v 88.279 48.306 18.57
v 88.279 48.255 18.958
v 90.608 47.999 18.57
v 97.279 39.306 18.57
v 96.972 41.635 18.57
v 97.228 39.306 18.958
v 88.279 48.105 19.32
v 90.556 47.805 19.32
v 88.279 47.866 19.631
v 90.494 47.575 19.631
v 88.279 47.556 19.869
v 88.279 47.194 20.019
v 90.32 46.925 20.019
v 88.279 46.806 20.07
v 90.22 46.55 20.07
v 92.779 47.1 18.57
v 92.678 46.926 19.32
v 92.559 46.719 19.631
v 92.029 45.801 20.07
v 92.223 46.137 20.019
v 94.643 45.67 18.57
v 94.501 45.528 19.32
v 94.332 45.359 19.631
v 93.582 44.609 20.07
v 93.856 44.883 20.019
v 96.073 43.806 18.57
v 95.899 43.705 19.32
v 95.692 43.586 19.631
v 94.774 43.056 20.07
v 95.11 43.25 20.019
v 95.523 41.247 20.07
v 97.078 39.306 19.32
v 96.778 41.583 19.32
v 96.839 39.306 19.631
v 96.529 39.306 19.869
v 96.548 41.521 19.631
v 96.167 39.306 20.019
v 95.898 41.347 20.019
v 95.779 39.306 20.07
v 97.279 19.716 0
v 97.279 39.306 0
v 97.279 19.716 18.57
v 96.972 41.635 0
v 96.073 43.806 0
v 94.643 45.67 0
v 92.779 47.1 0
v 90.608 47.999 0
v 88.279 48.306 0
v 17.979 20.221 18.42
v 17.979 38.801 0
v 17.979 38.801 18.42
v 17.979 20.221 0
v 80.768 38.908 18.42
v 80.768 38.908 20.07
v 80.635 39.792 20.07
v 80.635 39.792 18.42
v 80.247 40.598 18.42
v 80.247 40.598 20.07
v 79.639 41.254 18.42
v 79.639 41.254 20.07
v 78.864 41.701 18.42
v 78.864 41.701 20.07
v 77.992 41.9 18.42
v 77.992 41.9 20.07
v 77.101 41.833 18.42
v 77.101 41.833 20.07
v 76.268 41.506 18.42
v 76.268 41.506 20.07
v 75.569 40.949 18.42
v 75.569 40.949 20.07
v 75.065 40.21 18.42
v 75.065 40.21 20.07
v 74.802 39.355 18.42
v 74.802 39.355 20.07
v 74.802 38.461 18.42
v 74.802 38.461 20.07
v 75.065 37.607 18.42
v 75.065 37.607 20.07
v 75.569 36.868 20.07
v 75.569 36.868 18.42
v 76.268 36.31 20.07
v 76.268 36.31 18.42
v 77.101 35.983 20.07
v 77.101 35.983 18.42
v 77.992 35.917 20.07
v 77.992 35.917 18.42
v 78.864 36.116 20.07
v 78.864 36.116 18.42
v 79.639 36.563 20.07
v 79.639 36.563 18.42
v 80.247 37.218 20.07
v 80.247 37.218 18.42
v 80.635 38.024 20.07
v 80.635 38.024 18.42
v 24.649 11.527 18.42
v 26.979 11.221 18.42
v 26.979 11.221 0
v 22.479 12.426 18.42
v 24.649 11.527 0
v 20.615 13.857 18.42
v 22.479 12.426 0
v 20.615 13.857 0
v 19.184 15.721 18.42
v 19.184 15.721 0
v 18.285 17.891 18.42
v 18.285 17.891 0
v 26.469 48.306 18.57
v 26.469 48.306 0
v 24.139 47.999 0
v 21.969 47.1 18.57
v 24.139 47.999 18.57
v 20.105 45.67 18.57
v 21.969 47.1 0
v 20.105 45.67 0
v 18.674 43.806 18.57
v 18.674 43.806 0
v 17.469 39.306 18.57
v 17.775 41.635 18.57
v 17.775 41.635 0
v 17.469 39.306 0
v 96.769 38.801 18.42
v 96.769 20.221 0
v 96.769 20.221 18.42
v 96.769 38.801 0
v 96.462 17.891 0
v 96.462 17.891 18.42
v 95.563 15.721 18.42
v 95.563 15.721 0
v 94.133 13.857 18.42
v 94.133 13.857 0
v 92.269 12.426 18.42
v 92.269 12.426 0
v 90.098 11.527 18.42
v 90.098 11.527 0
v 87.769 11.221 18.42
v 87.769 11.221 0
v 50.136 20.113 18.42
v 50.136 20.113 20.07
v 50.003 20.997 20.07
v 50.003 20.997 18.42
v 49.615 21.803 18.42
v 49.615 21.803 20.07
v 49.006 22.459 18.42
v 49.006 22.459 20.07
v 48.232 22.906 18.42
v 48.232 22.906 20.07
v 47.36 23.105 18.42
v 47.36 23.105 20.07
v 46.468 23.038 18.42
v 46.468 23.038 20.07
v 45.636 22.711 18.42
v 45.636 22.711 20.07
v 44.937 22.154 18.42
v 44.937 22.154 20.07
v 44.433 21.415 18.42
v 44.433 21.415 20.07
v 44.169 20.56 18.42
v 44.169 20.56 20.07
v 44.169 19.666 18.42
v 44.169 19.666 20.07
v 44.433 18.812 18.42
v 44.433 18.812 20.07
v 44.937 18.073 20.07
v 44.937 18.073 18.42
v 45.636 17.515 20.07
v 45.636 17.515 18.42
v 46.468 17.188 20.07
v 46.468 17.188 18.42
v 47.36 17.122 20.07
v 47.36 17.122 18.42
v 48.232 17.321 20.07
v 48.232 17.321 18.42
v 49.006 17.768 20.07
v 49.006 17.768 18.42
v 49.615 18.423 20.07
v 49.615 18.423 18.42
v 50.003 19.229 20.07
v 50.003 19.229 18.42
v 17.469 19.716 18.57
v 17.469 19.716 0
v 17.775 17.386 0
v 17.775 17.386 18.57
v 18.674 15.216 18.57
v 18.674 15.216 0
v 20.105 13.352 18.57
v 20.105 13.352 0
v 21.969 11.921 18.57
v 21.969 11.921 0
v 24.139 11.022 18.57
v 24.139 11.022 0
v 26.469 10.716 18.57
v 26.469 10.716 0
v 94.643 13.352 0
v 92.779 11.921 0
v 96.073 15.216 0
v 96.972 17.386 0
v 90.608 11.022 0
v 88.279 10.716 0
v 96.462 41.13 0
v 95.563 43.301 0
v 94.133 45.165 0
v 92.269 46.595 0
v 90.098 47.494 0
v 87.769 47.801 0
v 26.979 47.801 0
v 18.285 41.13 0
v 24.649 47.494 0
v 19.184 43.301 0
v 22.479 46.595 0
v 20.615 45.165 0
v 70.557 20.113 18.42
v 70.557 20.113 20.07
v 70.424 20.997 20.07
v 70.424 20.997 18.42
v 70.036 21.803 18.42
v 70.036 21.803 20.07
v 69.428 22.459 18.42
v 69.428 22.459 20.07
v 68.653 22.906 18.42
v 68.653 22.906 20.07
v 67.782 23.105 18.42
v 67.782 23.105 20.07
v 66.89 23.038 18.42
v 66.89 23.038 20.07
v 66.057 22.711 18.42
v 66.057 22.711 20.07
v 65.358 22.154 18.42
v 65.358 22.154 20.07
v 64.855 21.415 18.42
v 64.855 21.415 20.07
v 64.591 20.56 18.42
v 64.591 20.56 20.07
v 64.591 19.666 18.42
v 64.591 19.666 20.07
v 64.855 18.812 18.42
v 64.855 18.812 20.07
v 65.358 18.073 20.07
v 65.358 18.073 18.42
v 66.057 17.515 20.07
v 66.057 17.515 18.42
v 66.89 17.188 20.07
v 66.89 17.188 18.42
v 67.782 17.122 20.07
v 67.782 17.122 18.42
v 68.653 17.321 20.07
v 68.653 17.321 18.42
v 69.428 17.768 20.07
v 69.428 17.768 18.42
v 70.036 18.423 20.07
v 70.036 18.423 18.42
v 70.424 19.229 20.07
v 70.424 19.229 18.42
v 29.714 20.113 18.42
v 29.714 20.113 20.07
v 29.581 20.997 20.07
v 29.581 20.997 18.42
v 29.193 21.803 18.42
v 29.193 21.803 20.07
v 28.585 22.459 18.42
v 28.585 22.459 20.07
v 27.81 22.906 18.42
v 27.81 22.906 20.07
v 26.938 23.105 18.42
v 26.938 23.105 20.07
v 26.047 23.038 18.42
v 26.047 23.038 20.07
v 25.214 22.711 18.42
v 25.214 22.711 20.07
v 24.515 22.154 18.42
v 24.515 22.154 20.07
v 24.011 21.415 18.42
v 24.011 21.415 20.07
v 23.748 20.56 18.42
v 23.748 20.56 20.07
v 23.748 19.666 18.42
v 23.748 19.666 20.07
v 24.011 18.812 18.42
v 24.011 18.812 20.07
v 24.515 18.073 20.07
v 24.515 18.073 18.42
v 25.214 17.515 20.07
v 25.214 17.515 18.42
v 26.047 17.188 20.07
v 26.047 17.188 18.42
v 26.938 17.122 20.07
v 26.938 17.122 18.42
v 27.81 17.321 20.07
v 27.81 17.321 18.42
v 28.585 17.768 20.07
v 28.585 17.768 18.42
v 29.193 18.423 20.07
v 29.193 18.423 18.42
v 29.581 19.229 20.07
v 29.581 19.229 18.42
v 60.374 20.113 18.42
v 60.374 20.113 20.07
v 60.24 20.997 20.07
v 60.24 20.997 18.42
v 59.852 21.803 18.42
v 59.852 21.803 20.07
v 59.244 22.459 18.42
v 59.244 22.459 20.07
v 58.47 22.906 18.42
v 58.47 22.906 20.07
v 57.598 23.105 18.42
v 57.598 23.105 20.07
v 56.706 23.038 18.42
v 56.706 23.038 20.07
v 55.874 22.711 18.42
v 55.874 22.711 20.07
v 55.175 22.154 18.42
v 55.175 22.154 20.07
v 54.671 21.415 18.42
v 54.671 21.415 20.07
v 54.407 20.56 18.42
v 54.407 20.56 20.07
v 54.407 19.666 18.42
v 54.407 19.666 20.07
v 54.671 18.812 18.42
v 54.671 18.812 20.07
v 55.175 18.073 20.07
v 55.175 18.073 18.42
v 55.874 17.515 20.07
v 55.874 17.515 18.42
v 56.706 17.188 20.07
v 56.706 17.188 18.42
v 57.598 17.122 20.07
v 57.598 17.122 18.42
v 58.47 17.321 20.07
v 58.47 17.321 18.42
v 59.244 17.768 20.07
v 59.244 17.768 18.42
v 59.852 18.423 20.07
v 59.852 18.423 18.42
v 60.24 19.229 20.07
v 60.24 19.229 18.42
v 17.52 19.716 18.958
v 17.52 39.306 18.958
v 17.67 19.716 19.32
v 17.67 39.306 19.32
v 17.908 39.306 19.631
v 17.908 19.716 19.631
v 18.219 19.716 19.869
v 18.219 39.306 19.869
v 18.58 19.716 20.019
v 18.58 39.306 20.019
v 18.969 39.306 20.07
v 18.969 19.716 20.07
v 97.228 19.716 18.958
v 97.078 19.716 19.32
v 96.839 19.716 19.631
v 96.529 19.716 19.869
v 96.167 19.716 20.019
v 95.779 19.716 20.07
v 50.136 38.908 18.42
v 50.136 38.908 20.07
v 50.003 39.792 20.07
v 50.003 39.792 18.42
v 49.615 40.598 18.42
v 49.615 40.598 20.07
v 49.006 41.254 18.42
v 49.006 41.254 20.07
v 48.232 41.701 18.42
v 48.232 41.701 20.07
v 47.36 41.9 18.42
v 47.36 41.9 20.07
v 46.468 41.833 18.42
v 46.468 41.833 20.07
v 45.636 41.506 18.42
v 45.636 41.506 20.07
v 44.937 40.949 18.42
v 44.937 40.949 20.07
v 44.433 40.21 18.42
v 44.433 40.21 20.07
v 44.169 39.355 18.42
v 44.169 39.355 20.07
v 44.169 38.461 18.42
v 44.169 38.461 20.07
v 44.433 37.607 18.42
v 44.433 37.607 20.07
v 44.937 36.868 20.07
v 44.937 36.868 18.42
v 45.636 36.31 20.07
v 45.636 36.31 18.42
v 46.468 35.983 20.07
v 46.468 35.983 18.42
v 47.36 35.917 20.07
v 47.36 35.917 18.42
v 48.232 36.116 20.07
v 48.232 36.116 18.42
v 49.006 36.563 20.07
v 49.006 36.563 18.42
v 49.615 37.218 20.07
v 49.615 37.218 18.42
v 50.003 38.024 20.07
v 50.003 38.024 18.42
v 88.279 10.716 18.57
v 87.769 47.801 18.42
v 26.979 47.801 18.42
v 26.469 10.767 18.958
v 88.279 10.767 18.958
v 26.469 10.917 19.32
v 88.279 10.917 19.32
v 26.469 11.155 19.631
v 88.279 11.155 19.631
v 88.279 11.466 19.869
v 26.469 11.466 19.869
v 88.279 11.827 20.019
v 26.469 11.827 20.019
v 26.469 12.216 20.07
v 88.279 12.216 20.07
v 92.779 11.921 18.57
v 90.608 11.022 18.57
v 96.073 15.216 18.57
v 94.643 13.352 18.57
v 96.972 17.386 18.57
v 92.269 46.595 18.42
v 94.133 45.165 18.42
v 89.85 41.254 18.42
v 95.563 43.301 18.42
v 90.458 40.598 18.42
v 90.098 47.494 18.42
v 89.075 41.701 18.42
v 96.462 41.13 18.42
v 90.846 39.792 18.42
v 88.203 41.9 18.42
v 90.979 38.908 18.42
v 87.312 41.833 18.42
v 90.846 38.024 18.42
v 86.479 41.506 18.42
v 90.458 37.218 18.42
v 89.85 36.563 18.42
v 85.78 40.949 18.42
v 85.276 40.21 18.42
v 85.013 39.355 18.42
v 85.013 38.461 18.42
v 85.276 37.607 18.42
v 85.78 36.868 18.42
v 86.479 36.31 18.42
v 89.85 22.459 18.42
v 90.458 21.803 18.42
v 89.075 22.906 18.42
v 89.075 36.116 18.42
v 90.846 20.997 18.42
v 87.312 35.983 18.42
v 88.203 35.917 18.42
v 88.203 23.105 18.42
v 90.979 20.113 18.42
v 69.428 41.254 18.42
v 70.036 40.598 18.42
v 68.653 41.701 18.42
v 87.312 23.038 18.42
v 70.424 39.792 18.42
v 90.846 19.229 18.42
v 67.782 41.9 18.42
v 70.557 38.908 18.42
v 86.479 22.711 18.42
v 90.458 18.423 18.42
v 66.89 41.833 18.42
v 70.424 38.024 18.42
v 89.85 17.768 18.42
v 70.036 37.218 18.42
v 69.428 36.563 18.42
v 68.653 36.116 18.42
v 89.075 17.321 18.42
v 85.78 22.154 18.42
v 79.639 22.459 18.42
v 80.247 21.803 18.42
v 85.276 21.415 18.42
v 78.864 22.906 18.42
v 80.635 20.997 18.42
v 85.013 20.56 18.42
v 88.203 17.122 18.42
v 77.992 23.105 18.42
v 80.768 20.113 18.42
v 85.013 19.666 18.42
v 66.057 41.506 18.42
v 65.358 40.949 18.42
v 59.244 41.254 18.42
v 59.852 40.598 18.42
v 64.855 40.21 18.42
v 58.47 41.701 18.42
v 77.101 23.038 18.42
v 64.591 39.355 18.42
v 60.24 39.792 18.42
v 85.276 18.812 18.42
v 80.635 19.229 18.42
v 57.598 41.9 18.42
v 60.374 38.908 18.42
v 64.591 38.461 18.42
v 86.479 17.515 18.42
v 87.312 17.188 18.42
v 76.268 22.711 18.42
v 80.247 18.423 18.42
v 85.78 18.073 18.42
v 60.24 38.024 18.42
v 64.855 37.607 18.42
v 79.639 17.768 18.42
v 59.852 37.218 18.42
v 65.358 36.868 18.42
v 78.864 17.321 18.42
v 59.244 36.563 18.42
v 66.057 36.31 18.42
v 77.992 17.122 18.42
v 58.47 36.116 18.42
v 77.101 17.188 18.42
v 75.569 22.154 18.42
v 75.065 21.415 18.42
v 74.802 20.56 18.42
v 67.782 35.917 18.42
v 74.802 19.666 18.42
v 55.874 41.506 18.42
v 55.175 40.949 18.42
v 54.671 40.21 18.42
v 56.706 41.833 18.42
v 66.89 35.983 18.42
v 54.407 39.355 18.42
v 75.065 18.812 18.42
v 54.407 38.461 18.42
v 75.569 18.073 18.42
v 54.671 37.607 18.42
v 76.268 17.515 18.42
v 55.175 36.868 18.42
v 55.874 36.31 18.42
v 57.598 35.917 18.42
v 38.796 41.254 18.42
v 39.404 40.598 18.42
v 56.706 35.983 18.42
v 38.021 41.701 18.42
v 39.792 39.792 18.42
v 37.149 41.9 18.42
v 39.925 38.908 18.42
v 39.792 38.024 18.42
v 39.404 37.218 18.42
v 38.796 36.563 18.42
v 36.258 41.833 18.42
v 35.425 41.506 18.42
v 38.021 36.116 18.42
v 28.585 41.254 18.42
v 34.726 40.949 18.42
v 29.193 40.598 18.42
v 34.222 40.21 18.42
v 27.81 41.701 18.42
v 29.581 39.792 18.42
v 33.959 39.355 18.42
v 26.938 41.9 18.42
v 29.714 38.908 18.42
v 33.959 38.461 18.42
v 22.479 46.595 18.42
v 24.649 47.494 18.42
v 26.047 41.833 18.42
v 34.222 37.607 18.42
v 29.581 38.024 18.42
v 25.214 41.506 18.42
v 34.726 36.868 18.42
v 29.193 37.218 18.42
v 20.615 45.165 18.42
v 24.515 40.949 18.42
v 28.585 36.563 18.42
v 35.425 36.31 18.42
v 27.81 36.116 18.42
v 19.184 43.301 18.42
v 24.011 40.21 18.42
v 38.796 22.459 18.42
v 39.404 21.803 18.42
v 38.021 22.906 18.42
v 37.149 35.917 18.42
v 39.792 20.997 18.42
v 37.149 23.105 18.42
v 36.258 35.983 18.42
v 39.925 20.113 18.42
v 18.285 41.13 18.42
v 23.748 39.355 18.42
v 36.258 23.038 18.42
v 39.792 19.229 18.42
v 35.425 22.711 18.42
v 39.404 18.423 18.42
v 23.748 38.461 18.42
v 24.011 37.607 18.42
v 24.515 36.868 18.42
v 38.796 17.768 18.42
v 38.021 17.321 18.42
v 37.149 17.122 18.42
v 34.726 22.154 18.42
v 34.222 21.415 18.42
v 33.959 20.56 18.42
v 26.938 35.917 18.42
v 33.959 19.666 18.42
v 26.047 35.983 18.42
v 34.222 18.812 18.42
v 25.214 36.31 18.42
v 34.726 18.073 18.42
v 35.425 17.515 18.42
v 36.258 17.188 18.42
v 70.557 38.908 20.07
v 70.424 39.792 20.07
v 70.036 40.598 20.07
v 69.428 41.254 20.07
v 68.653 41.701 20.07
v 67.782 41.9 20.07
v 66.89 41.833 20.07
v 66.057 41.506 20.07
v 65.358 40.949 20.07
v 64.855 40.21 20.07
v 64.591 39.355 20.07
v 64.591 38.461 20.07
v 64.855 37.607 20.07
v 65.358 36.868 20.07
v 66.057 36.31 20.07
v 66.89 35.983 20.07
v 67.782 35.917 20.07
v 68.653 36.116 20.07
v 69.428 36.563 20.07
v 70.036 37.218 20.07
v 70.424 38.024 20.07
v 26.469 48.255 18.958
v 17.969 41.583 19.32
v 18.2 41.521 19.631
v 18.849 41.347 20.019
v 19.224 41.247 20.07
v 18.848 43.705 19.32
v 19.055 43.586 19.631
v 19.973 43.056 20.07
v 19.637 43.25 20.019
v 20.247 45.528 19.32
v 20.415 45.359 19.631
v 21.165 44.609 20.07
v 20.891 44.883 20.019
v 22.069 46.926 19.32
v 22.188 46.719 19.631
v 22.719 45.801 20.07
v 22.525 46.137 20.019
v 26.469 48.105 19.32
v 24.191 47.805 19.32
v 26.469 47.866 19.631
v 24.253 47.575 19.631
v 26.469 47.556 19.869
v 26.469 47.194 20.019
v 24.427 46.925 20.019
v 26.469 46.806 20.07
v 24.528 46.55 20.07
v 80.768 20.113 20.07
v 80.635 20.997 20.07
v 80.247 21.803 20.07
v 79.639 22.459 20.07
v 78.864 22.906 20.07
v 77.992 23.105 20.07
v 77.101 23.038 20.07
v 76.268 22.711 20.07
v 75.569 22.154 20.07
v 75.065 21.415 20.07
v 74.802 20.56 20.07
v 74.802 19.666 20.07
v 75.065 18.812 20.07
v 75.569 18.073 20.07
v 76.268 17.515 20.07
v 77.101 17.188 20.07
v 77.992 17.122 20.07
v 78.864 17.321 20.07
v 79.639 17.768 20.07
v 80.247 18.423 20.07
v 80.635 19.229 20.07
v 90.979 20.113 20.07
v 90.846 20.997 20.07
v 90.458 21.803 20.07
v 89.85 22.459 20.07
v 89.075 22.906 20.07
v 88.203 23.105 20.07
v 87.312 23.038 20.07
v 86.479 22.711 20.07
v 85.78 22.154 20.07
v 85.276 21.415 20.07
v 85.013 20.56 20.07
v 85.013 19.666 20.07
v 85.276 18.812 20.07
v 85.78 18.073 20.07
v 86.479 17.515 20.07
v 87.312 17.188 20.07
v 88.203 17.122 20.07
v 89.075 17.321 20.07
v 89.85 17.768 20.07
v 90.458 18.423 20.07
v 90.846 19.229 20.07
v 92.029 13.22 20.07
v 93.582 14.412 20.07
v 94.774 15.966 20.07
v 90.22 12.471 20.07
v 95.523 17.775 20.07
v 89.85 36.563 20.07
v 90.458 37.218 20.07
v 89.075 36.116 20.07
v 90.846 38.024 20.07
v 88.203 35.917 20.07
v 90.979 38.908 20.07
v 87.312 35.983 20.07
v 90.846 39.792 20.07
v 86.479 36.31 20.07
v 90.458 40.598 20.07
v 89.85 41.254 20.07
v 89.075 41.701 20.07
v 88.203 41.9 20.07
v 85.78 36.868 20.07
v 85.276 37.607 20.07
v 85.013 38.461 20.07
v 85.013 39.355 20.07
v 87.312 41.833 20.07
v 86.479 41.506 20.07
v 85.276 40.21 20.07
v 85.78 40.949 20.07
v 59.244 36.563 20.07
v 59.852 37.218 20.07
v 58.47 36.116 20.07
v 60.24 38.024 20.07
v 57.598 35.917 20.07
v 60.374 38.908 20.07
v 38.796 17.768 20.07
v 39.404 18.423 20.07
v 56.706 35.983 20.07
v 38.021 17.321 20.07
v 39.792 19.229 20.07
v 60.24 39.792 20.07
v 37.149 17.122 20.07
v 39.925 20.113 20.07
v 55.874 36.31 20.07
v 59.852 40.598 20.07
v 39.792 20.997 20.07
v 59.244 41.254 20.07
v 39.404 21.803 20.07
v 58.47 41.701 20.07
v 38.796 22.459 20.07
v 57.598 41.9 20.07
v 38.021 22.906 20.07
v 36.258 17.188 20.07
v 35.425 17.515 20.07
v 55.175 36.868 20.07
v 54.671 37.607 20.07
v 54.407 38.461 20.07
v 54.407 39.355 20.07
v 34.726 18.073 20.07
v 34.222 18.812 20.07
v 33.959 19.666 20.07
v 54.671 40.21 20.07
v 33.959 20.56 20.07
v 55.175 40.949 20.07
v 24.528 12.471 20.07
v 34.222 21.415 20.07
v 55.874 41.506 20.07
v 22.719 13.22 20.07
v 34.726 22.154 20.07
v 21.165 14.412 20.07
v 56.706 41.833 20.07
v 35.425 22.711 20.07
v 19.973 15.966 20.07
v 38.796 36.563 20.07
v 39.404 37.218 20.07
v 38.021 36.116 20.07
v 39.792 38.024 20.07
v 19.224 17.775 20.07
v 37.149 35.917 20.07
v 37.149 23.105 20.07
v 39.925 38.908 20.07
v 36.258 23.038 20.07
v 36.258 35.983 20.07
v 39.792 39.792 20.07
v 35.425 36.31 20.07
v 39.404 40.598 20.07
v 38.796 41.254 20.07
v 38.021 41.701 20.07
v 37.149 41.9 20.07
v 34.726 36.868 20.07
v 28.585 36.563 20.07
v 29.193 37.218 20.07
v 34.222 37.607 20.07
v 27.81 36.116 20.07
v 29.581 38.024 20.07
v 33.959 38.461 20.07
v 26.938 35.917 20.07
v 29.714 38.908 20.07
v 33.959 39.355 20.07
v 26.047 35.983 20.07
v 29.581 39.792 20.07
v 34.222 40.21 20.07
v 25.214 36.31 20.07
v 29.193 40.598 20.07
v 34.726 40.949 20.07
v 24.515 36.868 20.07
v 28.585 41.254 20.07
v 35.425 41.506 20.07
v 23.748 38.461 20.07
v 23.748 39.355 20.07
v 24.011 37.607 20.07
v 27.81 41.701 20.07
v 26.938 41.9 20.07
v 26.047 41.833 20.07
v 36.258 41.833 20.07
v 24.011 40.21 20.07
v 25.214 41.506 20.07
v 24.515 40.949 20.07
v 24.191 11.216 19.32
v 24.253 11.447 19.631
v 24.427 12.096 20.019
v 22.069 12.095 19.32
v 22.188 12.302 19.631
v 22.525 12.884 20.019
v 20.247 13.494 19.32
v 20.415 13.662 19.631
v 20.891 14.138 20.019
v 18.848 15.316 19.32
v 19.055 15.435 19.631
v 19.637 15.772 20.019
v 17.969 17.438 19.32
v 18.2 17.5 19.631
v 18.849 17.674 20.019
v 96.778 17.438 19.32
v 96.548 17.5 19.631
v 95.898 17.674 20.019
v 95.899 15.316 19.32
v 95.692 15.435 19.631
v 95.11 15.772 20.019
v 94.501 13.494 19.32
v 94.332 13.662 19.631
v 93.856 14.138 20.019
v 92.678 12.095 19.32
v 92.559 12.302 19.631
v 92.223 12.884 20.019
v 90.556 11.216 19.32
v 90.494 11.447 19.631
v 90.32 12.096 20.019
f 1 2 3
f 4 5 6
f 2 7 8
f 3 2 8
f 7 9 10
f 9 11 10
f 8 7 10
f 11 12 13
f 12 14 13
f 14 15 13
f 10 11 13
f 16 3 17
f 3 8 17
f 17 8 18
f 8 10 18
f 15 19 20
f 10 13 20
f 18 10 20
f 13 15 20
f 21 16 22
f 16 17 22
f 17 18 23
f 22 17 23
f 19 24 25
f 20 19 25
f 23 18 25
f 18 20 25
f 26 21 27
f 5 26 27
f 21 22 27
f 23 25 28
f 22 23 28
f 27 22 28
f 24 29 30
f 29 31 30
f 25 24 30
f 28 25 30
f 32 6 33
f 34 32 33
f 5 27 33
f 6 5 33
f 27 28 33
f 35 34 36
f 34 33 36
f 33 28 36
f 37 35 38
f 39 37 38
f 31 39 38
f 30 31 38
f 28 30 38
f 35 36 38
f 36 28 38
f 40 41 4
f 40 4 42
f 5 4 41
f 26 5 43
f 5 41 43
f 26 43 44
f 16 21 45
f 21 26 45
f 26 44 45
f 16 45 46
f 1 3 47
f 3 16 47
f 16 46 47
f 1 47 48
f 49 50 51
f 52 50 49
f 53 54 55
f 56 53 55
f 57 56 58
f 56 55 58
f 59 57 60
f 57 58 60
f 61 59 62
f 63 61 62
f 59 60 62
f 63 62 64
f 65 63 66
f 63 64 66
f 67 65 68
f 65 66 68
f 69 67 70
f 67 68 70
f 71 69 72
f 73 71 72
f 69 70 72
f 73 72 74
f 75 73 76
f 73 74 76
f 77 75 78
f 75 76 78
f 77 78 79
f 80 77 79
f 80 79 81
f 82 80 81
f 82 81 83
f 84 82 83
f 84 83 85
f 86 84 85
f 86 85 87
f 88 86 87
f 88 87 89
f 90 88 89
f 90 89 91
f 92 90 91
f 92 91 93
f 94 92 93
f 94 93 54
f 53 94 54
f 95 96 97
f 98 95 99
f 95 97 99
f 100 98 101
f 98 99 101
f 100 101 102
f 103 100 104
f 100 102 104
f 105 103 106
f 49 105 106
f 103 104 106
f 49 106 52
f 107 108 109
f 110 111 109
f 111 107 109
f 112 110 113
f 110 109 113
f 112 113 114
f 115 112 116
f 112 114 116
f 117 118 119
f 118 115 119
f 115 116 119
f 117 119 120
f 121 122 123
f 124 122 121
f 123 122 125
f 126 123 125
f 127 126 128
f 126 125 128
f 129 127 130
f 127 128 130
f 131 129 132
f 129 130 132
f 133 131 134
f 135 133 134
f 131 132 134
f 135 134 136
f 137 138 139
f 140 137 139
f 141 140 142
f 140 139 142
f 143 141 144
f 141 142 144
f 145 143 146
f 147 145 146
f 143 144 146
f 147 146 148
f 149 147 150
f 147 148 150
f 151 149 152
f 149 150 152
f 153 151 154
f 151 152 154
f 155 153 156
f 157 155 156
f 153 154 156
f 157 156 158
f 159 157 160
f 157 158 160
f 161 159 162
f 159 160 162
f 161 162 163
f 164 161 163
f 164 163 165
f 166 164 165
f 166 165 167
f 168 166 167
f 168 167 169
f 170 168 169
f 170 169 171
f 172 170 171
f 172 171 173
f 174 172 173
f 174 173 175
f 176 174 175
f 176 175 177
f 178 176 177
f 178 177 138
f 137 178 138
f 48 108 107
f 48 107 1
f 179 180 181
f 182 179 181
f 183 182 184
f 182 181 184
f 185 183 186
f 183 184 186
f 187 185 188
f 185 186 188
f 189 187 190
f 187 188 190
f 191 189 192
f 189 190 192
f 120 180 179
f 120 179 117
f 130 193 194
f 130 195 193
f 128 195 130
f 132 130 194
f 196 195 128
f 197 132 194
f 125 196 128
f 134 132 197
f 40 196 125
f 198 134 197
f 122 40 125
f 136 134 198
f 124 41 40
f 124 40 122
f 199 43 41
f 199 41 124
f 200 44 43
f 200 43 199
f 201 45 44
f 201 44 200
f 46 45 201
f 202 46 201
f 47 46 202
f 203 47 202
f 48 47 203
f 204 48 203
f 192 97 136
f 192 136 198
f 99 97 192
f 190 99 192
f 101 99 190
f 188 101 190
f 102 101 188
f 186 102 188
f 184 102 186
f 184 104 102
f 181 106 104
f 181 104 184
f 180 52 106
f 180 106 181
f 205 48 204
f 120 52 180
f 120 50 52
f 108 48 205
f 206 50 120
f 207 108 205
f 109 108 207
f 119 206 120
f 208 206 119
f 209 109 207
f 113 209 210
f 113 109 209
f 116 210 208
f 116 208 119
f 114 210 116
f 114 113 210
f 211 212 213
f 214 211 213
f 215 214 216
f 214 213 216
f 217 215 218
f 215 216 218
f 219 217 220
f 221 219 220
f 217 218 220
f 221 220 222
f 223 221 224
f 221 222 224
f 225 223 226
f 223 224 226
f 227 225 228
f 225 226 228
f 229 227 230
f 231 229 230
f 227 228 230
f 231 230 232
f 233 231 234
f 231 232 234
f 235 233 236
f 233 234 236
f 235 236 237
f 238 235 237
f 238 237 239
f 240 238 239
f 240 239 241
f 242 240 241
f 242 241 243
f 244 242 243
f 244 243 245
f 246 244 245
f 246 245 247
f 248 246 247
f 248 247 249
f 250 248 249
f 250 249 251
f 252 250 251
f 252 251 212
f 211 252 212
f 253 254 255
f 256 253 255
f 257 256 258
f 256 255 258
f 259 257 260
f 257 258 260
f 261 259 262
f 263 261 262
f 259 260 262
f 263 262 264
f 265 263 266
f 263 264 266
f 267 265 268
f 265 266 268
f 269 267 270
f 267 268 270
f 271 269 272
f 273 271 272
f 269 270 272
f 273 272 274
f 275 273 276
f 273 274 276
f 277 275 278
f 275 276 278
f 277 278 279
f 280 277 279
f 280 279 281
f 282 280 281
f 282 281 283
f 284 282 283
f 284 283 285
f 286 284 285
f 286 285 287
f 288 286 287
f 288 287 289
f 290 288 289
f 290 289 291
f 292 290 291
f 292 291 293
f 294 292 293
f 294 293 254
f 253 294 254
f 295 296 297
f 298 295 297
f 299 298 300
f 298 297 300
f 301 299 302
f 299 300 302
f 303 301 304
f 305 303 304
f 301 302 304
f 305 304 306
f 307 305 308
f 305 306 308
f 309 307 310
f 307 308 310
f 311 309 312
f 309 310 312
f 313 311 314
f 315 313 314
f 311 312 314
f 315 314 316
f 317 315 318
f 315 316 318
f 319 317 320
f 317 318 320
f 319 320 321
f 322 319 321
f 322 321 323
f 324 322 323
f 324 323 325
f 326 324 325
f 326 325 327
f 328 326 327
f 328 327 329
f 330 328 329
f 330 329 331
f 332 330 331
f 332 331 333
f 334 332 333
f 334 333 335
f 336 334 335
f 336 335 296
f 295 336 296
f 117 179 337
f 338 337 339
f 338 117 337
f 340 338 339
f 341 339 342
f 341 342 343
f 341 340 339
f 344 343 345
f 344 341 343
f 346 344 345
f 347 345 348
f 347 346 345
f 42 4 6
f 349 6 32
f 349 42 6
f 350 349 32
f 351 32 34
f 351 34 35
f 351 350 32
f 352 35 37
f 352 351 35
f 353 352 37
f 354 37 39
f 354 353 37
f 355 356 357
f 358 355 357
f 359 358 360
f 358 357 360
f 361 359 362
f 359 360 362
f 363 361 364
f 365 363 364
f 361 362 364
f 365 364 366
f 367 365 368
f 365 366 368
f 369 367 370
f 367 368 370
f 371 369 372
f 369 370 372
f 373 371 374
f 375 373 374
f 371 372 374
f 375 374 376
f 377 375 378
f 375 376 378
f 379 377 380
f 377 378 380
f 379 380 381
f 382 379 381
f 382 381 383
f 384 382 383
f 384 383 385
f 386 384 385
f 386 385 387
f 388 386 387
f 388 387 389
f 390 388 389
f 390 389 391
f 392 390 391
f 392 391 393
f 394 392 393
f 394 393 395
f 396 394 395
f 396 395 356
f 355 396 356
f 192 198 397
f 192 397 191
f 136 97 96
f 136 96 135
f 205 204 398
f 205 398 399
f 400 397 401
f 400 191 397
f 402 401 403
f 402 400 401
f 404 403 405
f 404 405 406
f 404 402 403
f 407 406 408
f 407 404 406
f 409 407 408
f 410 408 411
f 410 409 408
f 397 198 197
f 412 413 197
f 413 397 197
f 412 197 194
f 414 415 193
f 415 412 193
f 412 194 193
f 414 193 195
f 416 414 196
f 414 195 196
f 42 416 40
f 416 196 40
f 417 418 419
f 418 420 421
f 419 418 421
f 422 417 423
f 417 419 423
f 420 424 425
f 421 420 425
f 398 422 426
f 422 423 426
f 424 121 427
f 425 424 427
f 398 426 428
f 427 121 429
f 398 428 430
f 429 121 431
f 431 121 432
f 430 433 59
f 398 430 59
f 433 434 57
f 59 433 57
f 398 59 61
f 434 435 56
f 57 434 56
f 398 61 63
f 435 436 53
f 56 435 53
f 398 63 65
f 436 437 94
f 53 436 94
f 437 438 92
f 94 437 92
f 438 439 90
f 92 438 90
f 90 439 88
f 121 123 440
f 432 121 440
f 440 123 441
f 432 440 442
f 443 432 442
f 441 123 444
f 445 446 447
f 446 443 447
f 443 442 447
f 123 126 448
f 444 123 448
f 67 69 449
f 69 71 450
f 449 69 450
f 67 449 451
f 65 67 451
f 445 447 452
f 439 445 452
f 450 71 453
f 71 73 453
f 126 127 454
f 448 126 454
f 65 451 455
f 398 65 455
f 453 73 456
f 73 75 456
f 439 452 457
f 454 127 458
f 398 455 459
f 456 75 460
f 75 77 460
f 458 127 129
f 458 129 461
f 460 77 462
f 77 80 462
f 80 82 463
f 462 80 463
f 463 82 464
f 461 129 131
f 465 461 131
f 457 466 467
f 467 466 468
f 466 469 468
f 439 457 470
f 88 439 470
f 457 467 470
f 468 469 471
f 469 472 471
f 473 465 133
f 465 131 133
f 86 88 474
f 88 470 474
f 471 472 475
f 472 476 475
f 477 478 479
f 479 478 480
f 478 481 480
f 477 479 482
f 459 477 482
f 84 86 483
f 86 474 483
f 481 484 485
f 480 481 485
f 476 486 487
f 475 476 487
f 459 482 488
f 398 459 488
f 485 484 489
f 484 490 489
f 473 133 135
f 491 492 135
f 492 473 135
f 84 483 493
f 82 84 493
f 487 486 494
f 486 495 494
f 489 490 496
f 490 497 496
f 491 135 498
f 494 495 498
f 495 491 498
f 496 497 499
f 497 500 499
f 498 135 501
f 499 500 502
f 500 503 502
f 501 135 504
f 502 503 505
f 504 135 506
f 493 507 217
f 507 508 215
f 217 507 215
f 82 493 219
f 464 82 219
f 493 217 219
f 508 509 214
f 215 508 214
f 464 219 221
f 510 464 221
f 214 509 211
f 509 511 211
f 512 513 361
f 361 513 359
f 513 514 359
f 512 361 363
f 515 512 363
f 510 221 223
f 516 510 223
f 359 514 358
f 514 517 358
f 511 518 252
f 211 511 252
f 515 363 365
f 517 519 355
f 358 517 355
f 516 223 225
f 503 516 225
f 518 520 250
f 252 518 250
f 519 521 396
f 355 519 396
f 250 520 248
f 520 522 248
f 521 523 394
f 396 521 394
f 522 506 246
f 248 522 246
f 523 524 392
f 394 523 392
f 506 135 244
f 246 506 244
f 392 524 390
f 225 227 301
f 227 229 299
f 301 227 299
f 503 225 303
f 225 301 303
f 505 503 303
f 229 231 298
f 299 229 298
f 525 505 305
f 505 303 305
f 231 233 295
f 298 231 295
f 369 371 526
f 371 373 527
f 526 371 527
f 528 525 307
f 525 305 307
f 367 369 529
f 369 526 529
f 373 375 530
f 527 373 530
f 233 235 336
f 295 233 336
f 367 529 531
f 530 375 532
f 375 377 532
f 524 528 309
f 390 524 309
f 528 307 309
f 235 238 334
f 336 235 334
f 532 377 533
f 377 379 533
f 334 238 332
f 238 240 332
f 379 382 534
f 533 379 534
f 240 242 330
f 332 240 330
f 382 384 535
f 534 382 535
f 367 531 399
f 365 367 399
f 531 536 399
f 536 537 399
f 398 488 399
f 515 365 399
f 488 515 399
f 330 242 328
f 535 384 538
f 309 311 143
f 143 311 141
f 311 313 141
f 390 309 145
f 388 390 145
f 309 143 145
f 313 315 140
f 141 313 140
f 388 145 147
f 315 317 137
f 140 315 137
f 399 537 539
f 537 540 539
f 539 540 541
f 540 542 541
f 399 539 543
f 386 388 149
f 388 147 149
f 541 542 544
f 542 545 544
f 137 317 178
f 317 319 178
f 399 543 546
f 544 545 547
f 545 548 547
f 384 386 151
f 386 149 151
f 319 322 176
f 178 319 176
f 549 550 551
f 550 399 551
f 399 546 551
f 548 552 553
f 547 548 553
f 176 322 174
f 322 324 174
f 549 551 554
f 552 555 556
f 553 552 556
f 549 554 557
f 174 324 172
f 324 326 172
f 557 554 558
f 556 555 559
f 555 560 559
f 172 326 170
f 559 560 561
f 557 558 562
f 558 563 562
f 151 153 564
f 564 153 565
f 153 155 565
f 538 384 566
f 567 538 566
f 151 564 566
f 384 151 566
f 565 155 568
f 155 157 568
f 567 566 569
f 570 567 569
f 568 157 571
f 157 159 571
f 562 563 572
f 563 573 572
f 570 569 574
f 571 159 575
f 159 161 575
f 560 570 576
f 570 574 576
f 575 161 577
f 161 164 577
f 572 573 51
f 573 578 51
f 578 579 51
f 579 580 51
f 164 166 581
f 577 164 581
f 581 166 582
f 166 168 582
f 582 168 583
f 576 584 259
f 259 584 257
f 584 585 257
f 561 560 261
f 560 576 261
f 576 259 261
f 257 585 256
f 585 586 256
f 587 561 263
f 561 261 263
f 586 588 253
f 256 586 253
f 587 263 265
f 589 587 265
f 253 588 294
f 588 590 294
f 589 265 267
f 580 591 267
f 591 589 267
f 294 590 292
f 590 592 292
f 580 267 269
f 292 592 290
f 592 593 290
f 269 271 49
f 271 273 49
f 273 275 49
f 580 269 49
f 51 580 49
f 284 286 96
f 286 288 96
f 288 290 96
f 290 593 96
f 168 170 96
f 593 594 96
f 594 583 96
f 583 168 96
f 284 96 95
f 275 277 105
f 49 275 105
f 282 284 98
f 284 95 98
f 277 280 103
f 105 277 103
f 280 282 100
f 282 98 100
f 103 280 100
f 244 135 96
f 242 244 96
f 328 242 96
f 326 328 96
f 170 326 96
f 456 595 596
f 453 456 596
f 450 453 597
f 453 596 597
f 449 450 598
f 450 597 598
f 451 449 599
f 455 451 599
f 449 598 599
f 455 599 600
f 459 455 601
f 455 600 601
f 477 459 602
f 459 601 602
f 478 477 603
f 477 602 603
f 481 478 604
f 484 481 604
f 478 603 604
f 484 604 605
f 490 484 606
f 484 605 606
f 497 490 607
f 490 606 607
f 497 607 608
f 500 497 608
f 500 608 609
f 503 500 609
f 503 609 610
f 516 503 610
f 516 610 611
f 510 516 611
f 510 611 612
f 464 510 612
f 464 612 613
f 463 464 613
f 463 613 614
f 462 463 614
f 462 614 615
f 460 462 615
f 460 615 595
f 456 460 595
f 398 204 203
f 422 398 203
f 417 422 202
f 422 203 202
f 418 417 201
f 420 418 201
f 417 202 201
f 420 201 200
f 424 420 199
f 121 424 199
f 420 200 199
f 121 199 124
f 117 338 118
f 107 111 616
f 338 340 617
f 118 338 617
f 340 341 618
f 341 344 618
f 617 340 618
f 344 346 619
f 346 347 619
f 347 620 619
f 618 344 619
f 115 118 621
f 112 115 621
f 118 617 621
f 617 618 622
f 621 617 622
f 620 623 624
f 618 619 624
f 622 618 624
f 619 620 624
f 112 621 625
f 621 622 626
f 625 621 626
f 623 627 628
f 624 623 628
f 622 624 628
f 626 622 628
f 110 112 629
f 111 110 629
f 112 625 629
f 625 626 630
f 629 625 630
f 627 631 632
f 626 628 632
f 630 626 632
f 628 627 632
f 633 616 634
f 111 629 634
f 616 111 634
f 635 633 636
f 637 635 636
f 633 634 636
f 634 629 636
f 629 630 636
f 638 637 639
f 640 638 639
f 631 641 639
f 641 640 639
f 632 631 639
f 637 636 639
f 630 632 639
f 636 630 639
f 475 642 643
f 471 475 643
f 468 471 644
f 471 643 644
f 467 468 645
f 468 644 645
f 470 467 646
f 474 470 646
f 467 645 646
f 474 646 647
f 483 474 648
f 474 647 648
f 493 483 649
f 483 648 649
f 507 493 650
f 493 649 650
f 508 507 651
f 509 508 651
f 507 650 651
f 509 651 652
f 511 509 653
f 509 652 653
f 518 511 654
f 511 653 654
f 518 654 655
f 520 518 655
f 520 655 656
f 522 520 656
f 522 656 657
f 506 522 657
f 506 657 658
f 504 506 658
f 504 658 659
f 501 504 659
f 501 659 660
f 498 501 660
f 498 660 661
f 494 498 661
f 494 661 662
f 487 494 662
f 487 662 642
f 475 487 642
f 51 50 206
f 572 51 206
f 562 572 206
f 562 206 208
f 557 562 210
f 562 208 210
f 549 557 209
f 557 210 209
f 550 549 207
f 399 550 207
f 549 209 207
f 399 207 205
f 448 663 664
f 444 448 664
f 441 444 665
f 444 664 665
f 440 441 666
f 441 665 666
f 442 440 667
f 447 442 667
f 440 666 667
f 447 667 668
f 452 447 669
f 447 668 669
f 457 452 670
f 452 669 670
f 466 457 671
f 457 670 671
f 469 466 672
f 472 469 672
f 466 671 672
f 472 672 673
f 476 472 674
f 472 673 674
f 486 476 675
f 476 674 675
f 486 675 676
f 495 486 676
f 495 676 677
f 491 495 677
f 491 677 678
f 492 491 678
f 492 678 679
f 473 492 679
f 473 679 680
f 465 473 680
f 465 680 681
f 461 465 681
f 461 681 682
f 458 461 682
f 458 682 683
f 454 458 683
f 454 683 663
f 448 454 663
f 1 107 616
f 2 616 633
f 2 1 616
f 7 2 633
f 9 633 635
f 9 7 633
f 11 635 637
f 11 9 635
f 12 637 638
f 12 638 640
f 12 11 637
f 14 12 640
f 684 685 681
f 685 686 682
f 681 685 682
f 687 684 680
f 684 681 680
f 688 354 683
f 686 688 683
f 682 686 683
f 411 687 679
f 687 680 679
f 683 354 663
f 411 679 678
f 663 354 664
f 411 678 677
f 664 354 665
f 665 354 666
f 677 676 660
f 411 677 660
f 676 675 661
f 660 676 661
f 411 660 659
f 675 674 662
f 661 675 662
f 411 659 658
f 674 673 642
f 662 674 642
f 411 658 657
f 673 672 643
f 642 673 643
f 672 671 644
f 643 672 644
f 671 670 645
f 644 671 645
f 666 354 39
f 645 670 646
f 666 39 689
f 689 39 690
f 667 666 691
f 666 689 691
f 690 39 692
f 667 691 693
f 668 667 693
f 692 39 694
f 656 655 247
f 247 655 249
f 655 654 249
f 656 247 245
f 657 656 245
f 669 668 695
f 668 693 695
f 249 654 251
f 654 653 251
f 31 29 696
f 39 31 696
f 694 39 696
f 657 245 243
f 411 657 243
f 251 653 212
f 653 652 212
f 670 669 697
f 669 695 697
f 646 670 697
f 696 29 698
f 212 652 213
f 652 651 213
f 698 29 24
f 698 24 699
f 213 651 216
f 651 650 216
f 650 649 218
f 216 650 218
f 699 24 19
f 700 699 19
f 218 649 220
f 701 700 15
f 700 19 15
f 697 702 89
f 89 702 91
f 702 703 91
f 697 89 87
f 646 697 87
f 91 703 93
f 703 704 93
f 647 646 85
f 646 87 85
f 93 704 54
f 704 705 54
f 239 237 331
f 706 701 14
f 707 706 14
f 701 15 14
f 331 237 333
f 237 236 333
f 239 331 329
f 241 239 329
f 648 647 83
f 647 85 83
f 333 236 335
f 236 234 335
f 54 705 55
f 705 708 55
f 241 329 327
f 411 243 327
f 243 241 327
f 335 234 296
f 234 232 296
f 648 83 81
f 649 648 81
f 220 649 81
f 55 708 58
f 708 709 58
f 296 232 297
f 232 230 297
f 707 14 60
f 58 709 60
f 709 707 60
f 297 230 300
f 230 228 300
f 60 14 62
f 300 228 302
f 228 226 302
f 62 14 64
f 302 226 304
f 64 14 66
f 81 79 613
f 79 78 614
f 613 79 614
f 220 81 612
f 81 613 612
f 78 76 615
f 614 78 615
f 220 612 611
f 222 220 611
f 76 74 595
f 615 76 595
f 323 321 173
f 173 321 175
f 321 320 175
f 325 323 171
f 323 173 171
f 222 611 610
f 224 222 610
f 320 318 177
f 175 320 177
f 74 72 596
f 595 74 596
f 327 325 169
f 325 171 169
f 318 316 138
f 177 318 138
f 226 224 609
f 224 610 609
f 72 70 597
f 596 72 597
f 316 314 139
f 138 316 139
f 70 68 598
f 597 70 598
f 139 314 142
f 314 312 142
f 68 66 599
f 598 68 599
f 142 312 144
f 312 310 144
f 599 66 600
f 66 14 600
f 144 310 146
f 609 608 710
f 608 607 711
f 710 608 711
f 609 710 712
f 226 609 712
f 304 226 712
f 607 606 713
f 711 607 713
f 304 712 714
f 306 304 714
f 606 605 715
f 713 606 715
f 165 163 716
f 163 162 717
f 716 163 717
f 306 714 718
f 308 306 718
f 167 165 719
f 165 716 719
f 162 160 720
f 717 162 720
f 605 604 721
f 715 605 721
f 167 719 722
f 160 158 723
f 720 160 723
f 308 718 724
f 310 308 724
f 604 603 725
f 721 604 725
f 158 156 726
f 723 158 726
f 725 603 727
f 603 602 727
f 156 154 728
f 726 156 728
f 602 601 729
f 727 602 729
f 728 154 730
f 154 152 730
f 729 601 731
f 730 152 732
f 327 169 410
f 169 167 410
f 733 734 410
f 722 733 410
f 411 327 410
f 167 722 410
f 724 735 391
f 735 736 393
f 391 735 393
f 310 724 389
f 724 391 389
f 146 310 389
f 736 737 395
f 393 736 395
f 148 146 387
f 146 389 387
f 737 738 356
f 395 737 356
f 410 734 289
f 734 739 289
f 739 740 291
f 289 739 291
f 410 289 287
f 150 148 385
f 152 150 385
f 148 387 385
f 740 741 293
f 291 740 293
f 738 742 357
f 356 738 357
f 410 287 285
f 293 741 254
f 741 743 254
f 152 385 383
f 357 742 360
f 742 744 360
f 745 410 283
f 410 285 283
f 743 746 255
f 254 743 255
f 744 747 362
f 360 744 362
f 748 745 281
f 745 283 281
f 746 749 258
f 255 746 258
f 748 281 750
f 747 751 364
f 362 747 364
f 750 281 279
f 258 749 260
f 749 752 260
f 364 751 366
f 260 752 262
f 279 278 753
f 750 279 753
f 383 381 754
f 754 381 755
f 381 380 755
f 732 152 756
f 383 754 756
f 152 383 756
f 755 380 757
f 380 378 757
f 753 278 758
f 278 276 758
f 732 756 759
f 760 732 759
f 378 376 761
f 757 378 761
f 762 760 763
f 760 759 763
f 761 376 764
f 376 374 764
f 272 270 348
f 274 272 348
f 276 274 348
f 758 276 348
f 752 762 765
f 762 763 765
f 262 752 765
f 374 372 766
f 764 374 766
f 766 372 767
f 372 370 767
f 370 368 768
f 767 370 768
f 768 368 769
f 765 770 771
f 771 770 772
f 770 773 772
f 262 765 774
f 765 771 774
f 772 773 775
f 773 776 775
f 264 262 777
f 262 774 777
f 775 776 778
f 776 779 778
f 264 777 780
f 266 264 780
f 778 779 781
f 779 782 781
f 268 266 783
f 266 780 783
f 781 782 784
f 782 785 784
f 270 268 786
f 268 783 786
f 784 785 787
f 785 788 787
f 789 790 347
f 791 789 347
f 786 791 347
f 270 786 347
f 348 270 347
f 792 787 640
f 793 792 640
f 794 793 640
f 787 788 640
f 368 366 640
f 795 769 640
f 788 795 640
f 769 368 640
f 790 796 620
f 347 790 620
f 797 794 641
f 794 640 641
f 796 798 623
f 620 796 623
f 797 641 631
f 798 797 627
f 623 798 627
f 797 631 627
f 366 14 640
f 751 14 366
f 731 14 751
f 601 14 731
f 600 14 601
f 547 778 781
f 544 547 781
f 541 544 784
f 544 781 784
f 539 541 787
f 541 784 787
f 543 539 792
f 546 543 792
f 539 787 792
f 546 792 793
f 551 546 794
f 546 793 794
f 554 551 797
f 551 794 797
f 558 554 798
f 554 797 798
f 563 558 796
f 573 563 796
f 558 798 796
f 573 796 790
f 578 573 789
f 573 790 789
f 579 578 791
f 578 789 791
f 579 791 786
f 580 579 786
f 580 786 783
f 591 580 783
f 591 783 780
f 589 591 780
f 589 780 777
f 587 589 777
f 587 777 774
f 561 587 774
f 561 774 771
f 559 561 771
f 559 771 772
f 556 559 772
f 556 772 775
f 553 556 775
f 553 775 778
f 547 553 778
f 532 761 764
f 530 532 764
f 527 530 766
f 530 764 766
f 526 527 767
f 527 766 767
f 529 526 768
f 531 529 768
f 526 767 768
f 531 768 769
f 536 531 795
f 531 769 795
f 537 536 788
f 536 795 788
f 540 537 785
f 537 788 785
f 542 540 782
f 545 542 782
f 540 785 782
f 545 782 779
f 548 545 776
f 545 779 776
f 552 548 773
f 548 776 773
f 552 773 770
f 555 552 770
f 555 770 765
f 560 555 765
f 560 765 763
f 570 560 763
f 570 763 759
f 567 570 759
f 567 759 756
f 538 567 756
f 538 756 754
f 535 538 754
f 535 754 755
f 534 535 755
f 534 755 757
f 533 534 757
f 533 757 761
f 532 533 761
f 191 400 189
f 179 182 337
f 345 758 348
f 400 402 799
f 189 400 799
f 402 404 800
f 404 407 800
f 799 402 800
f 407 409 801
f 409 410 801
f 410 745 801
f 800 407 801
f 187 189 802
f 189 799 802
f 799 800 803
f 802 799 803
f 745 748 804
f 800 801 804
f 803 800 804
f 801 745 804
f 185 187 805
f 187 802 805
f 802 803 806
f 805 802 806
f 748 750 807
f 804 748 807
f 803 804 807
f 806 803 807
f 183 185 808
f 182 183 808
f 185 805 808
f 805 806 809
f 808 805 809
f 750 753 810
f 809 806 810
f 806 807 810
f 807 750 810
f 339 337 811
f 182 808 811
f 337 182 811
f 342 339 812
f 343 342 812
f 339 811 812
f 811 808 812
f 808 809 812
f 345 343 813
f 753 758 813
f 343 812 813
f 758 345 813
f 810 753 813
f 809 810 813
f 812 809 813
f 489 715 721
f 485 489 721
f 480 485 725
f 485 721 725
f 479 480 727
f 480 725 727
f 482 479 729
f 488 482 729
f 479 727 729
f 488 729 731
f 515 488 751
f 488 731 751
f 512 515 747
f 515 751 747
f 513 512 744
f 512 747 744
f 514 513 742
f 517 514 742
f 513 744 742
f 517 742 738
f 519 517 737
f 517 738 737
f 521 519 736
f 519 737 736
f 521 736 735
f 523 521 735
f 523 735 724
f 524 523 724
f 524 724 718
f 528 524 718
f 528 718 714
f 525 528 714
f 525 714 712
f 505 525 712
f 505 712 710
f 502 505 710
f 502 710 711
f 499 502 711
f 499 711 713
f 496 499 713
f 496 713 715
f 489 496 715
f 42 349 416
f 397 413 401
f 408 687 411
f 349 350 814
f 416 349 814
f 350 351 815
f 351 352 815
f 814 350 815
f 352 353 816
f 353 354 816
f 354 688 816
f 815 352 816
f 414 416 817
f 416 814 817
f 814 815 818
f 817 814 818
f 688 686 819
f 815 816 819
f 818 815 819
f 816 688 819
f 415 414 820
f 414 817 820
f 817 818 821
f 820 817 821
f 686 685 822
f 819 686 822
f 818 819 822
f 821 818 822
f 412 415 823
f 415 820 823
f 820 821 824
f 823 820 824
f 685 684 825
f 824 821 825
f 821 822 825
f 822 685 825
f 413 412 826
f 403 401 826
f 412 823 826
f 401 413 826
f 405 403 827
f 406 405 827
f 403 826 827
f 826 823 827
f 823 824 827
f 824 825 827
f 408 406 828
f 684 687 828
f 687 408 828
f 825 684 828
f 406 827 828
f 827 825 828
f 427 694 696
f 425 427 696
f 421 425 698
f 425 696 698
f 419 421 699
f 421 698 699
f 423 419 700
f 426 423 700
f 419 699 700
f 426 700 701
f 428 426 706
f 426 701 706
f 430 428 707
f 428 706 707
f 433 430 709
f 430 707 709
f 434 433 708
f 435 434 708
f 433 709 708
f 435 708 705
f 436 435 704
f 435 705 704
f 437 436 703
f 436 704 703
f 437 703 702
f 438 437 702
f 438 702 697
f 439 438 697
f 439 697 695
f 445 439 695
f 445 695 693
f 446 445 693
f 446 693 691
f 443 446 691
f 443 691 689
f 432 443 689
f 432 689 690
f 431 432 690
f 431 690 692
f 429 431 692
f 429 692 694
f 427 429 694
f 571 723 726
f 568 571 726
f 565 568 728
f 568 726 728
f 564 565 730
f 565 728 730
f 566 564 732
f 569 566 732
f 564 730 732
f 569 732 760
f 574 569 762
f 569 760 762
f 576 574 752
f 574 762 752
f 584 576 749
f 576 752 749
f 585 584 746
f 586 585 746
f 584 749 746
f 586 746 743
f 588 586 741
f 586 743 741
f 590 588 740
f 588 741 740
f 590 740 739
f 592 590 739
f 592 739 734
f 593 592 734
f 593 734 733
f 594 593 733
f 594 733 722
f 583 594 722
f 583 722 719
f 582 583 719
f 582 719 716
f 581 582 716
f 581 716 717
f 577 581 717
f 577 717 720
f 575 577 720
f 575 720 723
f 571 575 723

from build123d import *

# Parameters (mm, degrees)
PAD_DEPTH     = 20.07
POCKET_DEPTH  = 18.42
SKETCH002_R   = 3
HOLE_DEPTH    = 25
SKETCH003_R   = 3
HOLE001_DEPTH = 25
SKETCH004_R   = 3
HOLE002_DEPTH = 25
SKETCH005_R   = 3
HOLE003_DEPTH = 25
SKETCH006_R   = 3
HOLE004_DEPTH = 25
SKETCH007_R   = 3
HOLE005_DEPTH = 25
SKETCH008_R   = 3
HOLE006_DEPTH = 25
FILLET_R      = 1.5
SKETCH009_R   = 3
HOLE007_DEPTH = 25
SKETCH010_R   = 3
HOLE008_DEPTH = 25
SKETCH011_R   = 3
HOLE009_DEPTH = 25
SKETCH012_R   = 3
HOLE010_DEPTH = 25
SKETCH013_R   = 3
HOLE011_DEPTH = 25
SKETCH014_R   = 3
HOLE012_DEPTH = 25
SKETCH015_R   = 3
HOLE013_DEPTH = 25


with BuildPart() as part:
    # Sketch → Pad (new body)
    with BuildSketch(Plane.XY):
        with BuildLine():
            Line((26.468666, 48.305671), (88.278666, 48.305671))
            ThreePointArc((97.278666, 39.305671), (94.642627, 45.669632), (88.278666, 48.305671))
            Line((97.278666, 39.305671), (97.278666, 19.715671))
            ThreePointArc((88.278666, 10.715671), (94.642627, 13.351709), (97.278666, 19.715671))
            Line((88.278666, 10.715671), (26.468666, 10.715671))
            ThreePointArc((17.468666, 19.715671), (20.104705, 13.351709), (26.468666, 10.715671))
            Line((17.468666, 19.715671), (17.468666, 39.305671))
            ThreePointArc((26.468666, 48.305671), (20.104705, 45.669632), (17.468666, 39.305671))
        make_face()
    extrude(amount=PAD_DEPTH)

    # Sketch001 (on Face9 of Pad) → Pocket (cut)
    with BuildSketch(Plane(origin=(0, 0, 0), x_dir=(1, 0, 0), z_dir=(0, 0, -1))):
        with BuildLine():
            Line((26.978666, -11.220671), (87.768666, -11.220671))
            ThreePointArc((96.768666, -20.220671), (94.132627, -13.856709), (87.768666, -11.220671))
            Line((96.768666, -20.220671), (96.768666, -38.800671))
            ThreePointArc((87.768666, -47.800671), (94.132627, -45.164632), (96.768666, -38.800671))
            Line((87.768666, -47.800671), (26.978666, -47.800671))
            ThreePointArc((17.978666, -38.800671), (20.614705, -45.164632), (26.978666, -47.800671))
            Line((17.978666, -38.800671), (17.978666, -20.220671))
            ThreePointArc((26.978666, -11.220671), (20.614705, -13.856709), (17.978666, -20.220671))
        make_face()
    extrude(amount=-POCKET_DEPTH, mode=Mode.SUBTRACT)

    # Sketch002 (on Face5 of Pocket) → Hole (cut)
    with BuildSketch(Plane.XY.offset(20.07)):
        with Locations((57.373666, 38.908171)):
            Circle(SKETCH002_R)
    extrude(amount=-HOLE_DEPTH, mode=Mode.SUBTRACT)

    # Sketch003 (on Face5 of Hole) → Hole001 (cut)
    with BuildSketch(Plane.XY.offset(20.07)):
        with Locations((47.135866, 38.908171)):
            Circle(SKETCH003_R)
    extrude(amount=-HOLE001_DEPTH, mode=Mode.SUBTRACT)

    # Sketch004 (on Face5 of Hole001) → Hole002 (cut)
    with BuildSketch(Plane.XY.offset(20.07)):
        with Locations((36.925066, 38.908171)):
            Circle(SKETCH004_R)
    extrude(amount=-HOLE002_DEPTH, mode=Mode.SUBTRACT)

    # Sketch005 (on Face5 of Hole002) → Hole003 (cut)
    with BuildSketch(Plane.XY.offset(20.07)):
        with Locations((26.714266, 38.908171)):
            Circle(SKETCH005_R)
    extrude(amount=-HOLE003_DEPTH, mode=Mode.SUBTRACT)

    # Sketch006 (on Face5 of Hole003) → Hole004 (cut)
    with BuildSketch(Plane.XY.offset(20.07)):
        with Locations((67.557466, 38.908171)):
            Circle(SKETCH006_R)
    extrude(amount=-HOLE004_DEPTH, mode=Mode.SUBTRACT)

    # Sketch007 (on Face5 of Hole004) → Hole005 (cut)
    with BuildSketch(Plane.XY.offset(20.07)):
        with Locations((77.768266, 38.908171)):
            Circle(SKETCH007_R)
    extrude(amount=-HOLE005_DEPTH, mode=Mode.SUBTRACT)

    # Sketch008 (on Face5 of Hole005) → Hole006 (cut)
    with BuildSketch(Plane.XY.offset(20.07)):
        with Locations((87.979066, 38.908171)):
            Circle(SKETCH008_R)
    extrude(amount=-HOLE006_DEPTH, mode=Mode.SUBTRACT)

    # Fillet
    fillet_edges = [part.edges().sort_by_distance(p)[0] for p in [
        (57.373666, 48.305671, 20.07),
    ]]
    fillet(fillet_edges, radius=FILLET_R)

    # Sketch009 (on Face8 of Fillet) → Hole007 (cut)
    with BuildSketch(Plane.XY.offset(20.07)):
        with Locations((57.373666, 20.113171)):
            Circle(SKETCH009_R)
    extrude(amount=-HOLE007_DEPTH, mode=Mode.SUBTRACT)

    # Sketch010 (on Face8 of Hole007) → Hole008 (cut)
    with BuildSketch(Plane.XY.offset(20.07)):
        with Locations((47.135866, 20.113171)):
            Circle(SKETCH010_R)
    extrude(amount=-HOLE008_DEPTH, mode=Mode.SUBTRACT)

    # Sketch011 (on Face8 of Hole008) → Hole009 (cut)
    with BuildSketch(Plane.XY.offset(20.07)):
        with Locations((36.925066, 20.113171)):
            Circle(SKETCH011_R)
    extrude(amount=-HOLE009_DEPTH, mode=Mode.SUBTRACT)

    # Sketch012 (on Face8 of Hole009) → Hole010 (cut)
    with BuildSketch(Plane.XY.offset(20.07)):
        with Locations((26.714266, 20.113171)):
            Circle(SKETCH012_R)
    extrude(amount=-HOLE010_DEPTH, mode=Mode.SUBTRACT)

    # Sketch013 (on Face8 of Hole010) → Hole011 (cut)
    with BuildSketch(Plane.XY.offset(20.07)):
        with Locations((67.557466, 20.113171)):
            Circle(SKETCH013_R)
    extrude(amount=-HOLE011_DEPTH, mode=Mode.SUBTRACT)

    # Sketch014 (on Face8 of Hole011) → Hole012 (cut)
    with BuildSketch(Plane.XY.offset(20.07)):
        with Locations((77.768266, 20.113171)):
            Circle(SKETCH014_R)
    extrude(amount=-HOLE012_DEPTH, mode=Mode.SUBTRACT)

    # Sketch015 (on Face8 of Hole012) → Hole013 (cut)
    with BuildSketch(Plane.XY.offset(20.07)):
        with Locations((87.979066, 20.113171)):
            Circle(SKETCH015_R)
    extrude(amount=-HOLE013_DEPTH, mode=Mode.SUBTRACT)


solid = part.part
